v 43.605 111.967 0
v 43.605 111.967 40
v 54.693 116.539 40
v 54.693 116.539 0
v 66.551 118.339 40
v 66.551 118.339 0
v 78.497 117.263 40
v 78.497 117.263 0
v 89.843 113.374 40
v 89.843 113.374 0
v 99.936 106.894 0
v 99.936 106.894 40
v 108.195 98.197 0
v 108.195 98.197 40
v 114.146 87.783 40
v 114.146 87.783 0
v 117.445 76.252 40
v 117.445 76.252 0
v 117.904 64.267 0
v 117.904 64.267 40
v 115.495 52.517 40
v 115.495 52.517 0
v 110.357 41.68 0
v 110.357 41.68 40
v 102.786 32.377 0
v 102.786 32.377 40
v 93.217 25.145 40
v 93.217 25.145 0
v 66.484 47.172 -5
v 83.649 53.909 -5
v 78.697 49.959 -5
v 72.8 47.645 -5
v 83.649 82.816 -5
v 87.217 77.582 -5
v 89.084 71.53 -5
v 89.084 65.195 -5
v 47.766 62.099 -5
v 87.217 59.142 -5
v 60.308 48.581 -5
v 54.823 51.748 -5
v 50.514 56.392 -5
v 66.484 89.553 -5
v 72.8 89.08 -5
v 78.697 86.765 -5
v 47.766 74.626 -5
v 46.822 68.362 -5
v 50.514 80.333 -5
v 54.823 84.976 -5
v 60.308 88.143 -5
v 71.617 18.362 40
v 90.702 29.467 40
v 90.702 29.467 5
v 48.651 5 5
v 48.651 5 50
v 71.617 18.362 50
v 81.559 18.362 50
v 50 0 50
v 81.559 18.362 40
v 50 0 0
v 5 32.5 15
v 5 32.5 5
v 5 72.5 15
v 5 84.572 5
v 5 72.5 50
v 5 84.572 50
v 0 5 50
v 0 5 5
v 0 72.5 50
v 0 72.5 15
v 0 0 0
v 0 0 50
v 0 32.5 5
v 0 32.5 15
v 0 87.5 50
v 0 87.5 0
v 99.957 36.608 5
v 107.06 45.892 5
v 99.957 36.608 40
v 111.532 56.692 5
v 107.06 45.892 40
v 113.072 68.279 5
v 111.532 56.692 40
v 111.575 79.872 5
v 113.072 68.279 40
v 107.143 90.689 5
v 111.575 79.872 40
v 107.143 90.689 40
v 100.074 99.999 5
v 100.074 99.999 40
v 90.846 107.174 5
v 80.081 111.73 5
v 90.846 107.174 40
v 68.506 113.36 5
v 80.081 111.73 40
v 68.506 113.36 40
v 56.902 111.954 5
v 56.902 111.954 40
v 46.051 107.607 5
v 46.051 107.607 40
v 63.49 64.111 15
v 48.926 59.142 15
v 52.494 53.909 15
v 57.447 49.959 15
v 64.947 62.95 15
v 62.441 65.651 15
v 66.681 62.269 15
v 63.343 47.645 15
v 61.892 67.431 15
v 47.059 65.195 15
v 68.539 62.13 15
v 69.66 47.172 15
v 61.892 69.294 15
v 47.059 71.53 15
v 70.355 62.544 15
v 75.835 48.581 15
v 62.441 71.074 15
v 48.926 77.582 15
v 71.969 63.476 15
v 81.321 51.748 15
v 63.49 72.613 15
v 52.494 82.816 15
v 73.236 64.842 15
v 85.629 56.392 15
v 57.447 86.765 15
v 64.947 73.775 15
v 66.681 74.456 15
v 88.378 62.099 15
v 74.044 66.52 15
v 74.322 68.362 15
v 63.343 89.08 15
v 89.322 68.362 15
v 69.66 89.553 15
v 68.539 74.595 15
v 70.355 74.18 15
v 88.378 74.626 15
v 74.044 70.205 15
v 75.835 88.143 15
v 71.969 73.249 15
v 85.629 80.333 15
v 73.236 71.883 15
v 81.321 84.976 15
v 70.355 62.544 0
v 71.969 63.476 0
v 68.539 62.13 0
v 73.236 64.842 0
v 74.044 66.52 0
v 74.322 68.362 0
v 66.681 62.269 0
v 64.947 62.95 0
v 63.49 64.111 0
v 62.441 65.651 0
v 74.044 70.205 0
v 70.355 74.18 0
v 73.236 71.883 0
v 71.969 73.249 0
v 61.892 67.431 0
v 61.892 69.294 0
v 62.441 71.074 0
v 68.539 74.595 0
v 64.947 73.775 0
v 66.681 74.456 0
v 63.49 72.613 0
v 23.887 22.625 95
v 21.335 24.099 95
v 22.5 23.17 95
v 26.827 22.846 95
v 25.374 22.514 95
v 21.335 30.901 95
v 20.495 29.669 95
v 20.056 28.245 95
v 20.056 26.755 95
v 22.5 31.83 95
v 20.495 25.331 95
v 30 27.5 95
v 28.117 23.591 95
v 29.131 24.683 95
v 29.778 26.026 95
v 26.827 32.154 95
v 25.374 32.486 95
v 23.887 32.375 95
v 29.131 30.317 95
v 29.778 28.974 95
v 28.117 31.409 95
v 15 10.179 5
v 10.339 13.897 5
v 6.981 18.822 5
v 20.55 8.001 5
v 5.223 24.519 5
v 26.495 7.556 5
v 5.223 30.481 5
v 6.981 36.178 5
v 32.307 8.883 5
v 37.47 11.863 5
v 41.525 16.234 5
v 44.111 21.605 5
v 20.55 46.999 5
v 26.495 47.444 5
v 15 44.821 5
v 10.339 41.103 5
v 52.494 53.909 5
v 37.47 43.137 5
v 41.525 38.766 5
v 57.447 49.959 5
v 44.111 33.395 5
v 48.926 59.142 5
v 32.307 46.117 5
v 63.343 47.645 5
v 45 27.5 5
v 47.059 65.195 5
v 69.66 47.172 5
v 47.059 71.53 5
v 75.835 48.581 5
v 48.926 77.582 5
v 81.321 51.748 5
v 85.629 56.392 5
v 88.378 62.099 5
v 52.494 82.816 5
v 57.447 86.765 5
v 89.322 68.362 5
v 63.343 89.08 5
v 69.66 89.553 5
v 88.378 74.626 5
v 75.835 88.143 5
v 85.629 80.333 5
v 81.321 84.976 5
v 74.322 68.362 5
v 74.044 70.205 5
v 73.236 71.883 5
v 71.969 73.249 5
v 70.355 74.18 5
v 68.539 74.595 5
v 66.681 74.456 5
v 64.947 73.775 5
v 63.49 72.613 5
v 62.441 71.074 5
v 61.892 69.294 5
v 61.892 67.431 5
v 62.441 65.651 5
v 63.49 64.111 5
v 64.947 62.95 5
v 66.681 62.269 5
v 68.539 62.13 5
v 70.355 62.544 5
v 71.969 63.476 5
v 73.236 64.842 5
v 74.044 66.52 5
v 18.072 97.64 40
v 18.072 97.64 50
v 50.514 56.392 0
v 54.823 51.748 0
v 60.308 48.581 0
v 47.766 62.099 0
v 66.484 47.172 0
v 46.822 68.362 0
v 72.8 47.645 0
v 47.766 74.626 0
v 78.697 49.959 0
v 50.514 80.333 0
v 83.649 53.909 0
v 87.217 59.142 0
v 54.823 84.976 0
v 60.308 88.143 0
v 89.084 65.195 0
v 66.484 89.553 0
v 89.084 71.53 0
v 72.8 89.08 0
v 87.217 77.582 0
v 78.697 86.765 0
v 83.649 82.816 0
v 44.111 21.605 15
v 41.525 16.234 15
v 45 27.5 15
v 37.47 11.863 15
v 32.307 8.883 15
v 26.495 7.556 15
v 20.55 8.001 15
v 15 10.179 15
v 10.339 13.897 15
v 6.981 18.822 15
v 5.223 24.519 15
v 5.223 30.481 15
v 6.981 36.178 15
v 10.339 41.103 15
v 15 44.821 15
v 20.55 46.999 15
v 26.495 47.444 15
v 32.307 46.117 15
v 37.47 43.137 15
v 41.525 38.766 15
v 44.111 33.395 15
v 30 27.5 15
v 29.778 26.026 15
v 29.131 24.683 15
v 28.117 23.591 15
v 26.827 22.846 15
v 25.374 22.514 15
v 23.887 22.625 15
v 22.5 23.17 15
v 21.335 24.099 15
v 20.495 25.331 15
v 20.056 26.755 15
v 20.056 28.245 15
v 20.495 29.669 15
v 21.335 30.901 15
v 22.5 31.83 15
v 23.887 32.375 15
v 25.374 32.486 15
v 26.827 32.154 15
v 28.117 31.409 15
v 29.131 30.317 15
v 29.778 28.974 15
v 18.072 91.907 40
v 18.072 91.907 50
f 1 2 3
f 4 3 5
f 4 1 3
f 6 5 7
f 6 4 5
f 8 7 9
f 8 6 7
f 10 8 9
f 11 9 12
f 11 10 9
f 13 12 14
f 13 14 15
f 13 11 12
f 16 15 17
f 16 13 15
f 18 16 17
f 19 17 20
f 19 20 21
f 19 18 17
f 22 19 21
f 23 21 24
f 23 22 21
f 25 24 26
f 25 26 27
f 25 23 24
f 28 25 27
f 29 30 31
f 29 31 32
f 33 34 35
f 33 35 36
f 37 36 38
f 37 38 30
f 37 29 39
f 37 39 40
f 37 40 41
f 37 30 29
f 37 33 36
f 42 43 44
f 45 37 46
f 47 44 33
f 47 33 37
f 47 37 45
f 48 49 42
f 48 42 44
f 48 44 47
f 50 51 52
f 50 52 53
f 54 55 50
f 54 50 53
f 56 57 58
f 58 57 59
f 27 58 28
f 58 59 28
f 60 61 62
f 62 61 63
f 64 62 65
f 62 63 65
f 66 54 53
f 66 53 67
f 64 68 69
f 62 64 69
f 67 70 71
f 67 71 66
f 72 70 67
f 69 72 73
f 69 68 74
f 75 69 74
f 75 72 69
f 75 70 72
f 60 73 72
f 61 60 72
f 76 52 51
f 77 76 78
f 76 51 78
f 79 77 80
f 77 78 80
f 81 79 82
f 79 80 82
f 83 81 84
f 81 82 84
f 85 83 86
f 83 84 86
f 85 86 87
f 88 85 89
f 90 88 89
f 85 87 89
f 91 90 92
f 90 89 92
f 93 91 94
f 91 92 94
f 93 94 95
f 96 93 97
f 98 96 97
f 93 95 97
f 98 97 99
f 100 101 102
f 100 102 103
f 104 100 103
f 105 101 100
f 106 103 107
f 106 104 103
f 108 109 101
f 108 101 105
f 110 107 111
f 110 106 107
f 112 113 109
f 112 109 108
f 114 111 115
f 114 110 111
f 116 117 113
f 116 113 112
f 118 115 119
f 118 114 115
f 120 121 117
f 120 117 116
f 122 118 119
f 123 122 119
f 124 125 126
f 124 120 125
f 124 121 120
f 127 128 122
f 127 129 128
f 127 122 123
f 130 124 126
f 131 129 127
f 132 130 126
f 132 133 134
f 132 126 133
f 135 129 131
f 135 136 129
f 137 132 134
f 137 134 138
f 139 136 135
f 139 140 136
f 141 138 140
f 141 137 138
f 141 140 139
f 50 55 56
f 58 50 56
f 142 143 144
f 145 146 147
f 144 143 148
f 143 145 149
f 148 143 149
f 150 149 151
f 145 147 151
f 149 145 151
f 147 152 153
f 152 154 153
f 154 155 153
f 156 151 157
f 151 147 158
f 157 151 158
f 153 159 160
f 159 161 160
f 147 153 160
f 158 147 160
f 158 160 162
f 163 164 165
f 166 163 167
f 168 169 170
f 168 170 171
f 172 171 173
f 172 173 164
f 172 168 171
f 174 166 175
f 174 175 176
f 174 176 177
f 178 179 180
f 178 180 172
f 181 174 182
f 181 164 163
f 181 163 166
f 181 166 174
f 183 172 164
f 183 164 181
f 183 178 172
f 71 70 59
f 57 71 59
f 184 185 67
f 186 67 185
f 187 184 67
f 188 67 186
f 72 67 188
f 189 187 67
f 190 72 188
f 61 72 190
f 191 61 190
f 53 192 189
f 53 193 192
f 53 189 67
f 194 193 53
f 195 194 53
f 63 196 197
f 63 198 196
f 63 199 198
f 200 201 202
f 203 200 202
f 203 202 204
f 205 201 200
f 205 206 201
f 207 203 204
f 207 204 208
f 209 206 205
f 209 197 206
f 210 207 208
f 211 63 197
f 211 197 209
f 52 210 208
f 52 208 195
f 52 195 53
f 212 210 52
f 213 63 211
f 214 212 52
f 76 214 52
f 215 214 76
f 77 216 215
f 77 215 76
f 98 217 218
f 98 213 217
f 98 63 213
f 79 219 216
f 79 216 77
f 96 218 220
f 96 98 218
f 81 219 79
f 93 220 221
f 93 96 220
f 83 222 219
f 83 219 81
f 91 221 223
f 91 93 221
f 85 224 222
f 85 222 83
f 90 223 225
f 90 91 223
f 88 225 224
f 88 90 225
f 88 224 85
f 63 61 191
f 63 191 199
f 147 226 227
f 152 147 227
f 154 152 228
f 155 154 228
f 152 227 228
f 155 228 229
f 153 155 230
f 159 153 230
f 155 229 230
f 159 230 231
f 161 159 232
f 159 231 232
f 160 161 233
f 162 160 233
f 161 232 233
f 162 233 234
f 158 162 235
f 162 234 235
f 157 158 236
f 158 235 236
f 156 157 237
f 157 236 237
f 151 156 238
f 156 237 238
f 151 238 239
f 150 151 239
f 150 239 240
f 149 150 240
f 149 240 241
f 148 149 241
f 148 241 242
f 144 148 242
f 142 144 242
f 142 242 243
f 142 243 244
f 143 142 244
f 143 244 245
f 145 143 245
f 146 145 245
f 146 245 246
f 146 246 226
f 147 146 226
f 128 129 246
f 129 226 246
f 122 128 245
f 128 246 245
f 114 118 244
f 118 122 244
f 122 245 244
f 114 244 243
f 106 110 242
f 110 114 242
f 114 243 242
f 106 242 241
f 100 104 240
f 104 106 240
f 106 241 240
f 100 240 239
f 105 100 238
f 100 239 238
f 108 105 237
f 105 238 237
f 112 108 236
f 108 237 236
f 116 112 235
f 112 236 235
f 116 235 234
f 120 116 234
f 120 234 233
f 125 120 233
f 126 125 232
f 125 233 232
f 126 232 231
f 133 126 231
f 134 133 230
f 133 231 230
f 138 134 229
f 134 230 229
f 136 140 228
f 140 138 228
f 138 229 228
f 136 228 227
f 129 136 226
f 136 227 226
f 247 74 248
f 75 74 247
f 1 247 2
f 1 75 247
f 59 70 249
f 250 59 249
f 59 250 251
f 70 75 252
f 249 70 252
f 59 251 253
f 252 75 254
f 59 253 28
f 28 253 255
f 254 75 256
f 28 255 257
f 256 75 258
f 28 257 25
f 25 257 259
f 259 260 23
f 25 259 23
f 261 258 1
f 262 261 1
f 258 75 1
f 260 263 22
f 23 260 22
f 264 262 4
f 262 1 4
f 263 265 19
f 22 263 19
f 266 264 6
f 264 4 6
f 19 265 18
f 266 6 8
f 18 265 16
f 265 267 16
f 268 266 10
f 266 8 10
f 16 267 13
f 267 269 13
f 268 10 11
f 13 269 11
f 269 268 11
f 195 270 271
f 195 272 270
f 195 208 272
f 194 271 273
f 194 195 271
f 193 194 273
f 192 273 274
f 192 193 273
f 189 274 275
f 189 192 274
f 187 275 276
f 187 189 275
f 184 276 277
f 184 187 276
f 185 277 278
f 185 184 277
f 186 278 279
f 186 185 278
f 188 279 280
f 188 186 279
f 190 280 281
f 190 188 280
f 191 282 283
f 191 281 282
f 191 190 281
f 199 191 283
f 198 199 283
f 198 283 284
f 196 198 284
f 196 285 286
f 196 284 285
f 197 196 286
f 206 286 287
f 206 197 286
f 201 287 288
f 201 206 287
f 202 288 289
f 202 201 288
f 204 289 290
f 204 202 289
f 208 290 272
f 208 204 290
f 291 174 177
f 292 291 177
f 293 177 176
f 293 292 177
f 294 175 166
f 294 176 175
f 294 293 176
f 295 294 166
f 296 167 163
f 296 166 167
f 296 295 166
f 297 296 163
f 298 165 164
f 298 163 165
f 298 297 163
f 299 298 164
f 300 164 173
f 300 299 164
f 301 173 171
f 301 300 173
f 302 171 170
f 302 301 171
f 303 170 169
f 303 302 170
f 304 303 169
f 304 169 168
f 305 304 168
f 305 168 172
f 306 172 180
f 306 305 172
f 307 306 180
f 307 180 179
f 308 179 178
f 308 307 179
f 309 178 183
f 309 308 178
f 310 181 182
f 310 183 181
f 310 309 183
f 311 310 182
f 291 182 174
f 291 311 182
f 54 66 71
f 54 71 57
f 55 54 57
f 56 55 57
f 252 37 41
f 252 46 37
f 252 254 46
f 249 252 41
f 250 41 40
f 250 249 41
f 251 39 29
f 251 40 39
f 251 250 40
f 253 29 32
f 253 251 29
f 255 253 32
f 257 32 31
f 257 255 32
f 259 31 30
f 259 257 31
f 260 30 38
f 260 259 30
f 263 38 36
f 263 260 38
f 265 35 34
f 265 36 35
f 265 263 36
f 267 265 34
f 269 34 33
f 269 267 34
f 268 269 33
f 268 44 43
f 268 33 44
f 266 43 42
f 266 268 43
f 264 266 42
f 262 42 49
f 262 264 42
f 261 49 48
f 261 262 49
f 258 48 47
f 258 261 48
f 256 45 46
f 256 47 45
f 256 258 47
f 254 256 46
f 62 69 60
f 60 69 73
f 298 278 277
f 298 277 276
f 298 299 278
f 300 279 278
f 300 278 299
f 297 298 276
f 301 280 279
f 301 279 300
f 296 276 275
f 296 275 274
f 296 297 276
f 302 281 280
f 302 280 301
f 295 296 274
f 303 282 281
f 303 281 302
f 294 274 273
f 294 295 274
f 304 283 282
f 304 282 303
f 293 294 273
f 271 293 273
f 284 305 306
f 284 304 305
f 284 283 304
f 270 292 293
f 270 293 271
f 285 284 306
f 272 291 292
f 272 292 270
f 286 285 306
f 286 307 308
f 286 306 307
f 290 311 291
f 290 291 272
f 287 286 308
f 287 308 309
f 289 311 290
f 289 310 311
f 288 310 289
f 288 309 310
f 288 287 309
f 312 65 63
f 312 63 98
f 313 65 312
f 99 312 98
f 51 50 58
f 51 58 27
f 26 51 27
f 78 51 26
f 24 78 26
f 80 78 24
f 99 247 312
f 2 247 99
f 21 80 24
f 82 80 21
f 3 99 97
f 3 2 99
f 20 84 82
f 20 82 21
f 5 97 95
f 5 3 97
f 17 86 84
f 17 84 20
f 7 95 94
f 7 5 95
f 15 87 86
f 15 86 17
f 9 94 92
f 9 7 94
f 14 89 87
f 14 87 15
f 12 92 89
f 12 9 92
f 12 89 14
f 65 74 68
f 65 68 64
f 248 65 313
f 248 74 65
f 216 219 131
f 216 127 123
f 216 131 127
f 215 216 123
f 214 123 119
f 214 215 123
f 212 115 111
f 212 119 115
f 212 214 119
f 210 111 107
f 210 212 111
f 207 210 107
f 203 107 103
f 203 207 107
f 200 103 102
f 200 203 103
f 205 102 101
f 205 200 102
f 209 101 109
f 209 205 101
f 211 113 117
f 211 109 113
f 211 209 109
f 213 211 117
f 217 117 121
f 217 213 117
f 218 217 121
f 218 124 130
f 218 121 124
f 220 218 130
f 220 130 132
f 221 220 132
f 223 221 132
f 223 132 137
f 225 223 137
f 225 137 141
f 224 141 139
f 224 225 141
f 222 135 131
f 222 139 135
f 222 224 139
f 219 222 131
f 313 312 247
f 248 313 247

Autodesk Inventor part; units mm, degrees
ref_plane "YZ Plane" through (0, 0, 0) normal (1, 0, 0) x (0, 1, 0)
ref_plane "XZ Plane" through (0, 0, 0) normal (0, 1, 0) x (-1, 0, 0)
ref_plane "XY Plane" through (0, 0, 0) normal (0, 0, 1) x (1, 0, 0)
sketch "Sketch1" plane through (0, 0, 0) normal (0, 0, 1) x (1, 0, 0)
  line L0 (0, 0) -> (0, 87.5)
  line L1 (0, 87.5) -> (43.6046, 111.967)
  line L2 (0, 0) -> (50, 0)
  line L3 (50, 0) -> (93.217, 25.1454)
  circle A0 centre (68.0717, 68.3624) radius 50 construction
  arc A1 (93.217, 25.1454) -> (43.6046, 111.967) centre (68.0717, 68.3624) ccw
  dimension "d0" = 87.5
  dimension "d1" = 50
  dimension "d2" = 50
  dimension "d3" = 50
  dimension "d4" = 100
extrude "Extrusion1" add sketch "Sketch1" along normal blind 50
sketch "Sketch2" plane through (0, 0, 50) normal (0, 0, 1) x (1, 0, 0)
  line L0 (0, 0) -> (50, 0) projected
  line L1 (50, 0) -> (93.217, 25.1454) projected
  arc A0 (93.217, 25.1454) -> (43.6046, 111.967) centre (68.0717, 68.3624) ccw projected
  line L2 (43.6046, 111.967) -> (0, 87.5) projected
  line L3 (0, 81.7667) -> (46.0513, 107.6066)
  arc A1 (90.7025, 29.4671) -> (46.0513, 107.6066) centre (68.0717, 68.3624) ccw
  line L4 (90.7025, 29.4671) -> (48.6512, 5)
  line L5 (48.6512, 5) -> (0, 5)
  line L6 (0, 87.5) -> (0, 0) projected
  line L7 (0, 5) -> (0, 81.7667)
  dimension "d7" = 5
extrude "Extrusion2" cut sketch "Sketch2" against normal blind 45 contours L6 L3 A1 L4 L5
sketch "Sketch3" plane through (0, 0, 0) normal (-1, 0, 0) x (0, 0, 1)
  line L0 (0, 87.5) -> (50, 87.5) projected
  line L1 (50, 113.3624) -> (50, 29.4671) projected
  line L2 (0, 87.5) -> (50, 87.5)
  line L3 (50, 87.5) -> (50, 72.5)
  line L4 (50, 72.5) -> (0, 72.5)
  line L5 (0, 72.5) -> (0, 87.5)
  point P0 (0, 0)
  point P1 (50, 107.6066)
  dimension "d10" = 15
extrude "Extrusion3" add sketch "Sketch3" against normal blind 5
sketch "Sketch4" plane through (0, 0, 0) normal (-1, 0, 0) x (0, 0, 1)
  line L0 (0, 87.5) -> (0, 111.967) projected
  line L1 (0, 87.5) -> (15, 87.5)
  line L2 (15, 87.5) -> (15, 32.5)
  line L3 (15, 32.5) -> (0, 32.5)
  line L4 (0, 32.5) -> (0, 87.5)
  line L5 (0, 0) -> (50, 0) projected
  dimension "d13" = 15
  dimension "d14" = 32.5
extrude "Extrusion4" add sketch "Sketch4" against normal blind 5
sketch "Sketch5" plane through (0, 0, 5) normal (0, 0, 1) x (1, 0, 0)
  circle A0 centre (25, 27.5) radius 5
  line L0 (0, 0) -> (50, 0) projected
  dimension "d17" = 10
  dimension "d18" = 27.5
  dimension "d19" = 25
extrude "Extrusion5" add sketch "Sketch5" along normal blind 90
sketch "Sketch6" plane through (0, 0, 5) normal (0, 0, 1) x (1, 0, 0)
  circle A0 centre (25, 27.5) radius 5 projected
  circle A1 centre (25, 27.5) radius 20
  point P0 (0, 0)
  dimension "d22" = 40
extrude "Extrusion6" add sketch "Sketch6" along normal blind 10
sketch "Sketch7" plane through (0, 0, 5) normal (0, 0, 1) x (1, 0, 0)
  arc A0 (93.217, 25.1454) -> (43.6046, 111.967) centre (68.0717, 68.3624) ccw projected
  circle A1 centre (68.0717, 68.3624) radius 6.25
  circle A2 centre (68.0717, 68.3624) radius 21.25
  point P0 (0, 0)
  dimension "d25" = 12.5
  dimension "d28" = 15
extrude "Extrusion8" add sketch "Sketch7" along normal blind 10
sketch "Sketch8" plane through (68.0717, 68.3624, 5) normal (0, 0, 1) x (1, 0, 0)
  circle A0 centre (0, 0) radius 6.25 projected
  circle A1 centre (0, 0) radius 6.25
  point P0 (-68.0717, -68.3624)
extrude "Extrusion9" cut sketch "Sketch8" against normal through all
sketch "Sketch9" plane through (0, 0, 0) normal (0, 0, -1) x (-1, 0, 0)
  circle A0 centre (-68.0717, 68.3624) radius 21.25 projected
  circle A1 centre (-68.0717, 68.3624) radius 21.25
  point P0 (0, 0)
extrude "Extrusion10" add sketch "Sketch9" along normal blind 5
sketch "Sketch10" plane through (0, 0, 50) normal (0, 0, 1) x (1, 0, 0)
  arc A0 (93.217, 25.1454) -> (43.6046, 111.967) centre (68.0717, 68.3624) ccw projected
  circle A1 centre (68.0717, 68.3624) radius 50
  line L0 (18.0717, 68.3624) -> (18.0717, 97.6402)
  line L1 (0, 87.5) -> (43.6046, 111.967) projected
  line L2 (43.6046, 111.967) -> (18.0717, 97.6402)
  line L3 (68.0717, 18.3624) -> (81.5592, 18.3624)
  line L4 (50, 0) -> (93.217, 25.1454) projected
  line L5 (81.5592, 18.3624) -> (93.217, 25.1454)
  point P0 (0, 0)
extrude "Extrusion11" cut sketch "Sketch10" against normal blind 10
properties part number "BA005" material "ABS Plastic"
